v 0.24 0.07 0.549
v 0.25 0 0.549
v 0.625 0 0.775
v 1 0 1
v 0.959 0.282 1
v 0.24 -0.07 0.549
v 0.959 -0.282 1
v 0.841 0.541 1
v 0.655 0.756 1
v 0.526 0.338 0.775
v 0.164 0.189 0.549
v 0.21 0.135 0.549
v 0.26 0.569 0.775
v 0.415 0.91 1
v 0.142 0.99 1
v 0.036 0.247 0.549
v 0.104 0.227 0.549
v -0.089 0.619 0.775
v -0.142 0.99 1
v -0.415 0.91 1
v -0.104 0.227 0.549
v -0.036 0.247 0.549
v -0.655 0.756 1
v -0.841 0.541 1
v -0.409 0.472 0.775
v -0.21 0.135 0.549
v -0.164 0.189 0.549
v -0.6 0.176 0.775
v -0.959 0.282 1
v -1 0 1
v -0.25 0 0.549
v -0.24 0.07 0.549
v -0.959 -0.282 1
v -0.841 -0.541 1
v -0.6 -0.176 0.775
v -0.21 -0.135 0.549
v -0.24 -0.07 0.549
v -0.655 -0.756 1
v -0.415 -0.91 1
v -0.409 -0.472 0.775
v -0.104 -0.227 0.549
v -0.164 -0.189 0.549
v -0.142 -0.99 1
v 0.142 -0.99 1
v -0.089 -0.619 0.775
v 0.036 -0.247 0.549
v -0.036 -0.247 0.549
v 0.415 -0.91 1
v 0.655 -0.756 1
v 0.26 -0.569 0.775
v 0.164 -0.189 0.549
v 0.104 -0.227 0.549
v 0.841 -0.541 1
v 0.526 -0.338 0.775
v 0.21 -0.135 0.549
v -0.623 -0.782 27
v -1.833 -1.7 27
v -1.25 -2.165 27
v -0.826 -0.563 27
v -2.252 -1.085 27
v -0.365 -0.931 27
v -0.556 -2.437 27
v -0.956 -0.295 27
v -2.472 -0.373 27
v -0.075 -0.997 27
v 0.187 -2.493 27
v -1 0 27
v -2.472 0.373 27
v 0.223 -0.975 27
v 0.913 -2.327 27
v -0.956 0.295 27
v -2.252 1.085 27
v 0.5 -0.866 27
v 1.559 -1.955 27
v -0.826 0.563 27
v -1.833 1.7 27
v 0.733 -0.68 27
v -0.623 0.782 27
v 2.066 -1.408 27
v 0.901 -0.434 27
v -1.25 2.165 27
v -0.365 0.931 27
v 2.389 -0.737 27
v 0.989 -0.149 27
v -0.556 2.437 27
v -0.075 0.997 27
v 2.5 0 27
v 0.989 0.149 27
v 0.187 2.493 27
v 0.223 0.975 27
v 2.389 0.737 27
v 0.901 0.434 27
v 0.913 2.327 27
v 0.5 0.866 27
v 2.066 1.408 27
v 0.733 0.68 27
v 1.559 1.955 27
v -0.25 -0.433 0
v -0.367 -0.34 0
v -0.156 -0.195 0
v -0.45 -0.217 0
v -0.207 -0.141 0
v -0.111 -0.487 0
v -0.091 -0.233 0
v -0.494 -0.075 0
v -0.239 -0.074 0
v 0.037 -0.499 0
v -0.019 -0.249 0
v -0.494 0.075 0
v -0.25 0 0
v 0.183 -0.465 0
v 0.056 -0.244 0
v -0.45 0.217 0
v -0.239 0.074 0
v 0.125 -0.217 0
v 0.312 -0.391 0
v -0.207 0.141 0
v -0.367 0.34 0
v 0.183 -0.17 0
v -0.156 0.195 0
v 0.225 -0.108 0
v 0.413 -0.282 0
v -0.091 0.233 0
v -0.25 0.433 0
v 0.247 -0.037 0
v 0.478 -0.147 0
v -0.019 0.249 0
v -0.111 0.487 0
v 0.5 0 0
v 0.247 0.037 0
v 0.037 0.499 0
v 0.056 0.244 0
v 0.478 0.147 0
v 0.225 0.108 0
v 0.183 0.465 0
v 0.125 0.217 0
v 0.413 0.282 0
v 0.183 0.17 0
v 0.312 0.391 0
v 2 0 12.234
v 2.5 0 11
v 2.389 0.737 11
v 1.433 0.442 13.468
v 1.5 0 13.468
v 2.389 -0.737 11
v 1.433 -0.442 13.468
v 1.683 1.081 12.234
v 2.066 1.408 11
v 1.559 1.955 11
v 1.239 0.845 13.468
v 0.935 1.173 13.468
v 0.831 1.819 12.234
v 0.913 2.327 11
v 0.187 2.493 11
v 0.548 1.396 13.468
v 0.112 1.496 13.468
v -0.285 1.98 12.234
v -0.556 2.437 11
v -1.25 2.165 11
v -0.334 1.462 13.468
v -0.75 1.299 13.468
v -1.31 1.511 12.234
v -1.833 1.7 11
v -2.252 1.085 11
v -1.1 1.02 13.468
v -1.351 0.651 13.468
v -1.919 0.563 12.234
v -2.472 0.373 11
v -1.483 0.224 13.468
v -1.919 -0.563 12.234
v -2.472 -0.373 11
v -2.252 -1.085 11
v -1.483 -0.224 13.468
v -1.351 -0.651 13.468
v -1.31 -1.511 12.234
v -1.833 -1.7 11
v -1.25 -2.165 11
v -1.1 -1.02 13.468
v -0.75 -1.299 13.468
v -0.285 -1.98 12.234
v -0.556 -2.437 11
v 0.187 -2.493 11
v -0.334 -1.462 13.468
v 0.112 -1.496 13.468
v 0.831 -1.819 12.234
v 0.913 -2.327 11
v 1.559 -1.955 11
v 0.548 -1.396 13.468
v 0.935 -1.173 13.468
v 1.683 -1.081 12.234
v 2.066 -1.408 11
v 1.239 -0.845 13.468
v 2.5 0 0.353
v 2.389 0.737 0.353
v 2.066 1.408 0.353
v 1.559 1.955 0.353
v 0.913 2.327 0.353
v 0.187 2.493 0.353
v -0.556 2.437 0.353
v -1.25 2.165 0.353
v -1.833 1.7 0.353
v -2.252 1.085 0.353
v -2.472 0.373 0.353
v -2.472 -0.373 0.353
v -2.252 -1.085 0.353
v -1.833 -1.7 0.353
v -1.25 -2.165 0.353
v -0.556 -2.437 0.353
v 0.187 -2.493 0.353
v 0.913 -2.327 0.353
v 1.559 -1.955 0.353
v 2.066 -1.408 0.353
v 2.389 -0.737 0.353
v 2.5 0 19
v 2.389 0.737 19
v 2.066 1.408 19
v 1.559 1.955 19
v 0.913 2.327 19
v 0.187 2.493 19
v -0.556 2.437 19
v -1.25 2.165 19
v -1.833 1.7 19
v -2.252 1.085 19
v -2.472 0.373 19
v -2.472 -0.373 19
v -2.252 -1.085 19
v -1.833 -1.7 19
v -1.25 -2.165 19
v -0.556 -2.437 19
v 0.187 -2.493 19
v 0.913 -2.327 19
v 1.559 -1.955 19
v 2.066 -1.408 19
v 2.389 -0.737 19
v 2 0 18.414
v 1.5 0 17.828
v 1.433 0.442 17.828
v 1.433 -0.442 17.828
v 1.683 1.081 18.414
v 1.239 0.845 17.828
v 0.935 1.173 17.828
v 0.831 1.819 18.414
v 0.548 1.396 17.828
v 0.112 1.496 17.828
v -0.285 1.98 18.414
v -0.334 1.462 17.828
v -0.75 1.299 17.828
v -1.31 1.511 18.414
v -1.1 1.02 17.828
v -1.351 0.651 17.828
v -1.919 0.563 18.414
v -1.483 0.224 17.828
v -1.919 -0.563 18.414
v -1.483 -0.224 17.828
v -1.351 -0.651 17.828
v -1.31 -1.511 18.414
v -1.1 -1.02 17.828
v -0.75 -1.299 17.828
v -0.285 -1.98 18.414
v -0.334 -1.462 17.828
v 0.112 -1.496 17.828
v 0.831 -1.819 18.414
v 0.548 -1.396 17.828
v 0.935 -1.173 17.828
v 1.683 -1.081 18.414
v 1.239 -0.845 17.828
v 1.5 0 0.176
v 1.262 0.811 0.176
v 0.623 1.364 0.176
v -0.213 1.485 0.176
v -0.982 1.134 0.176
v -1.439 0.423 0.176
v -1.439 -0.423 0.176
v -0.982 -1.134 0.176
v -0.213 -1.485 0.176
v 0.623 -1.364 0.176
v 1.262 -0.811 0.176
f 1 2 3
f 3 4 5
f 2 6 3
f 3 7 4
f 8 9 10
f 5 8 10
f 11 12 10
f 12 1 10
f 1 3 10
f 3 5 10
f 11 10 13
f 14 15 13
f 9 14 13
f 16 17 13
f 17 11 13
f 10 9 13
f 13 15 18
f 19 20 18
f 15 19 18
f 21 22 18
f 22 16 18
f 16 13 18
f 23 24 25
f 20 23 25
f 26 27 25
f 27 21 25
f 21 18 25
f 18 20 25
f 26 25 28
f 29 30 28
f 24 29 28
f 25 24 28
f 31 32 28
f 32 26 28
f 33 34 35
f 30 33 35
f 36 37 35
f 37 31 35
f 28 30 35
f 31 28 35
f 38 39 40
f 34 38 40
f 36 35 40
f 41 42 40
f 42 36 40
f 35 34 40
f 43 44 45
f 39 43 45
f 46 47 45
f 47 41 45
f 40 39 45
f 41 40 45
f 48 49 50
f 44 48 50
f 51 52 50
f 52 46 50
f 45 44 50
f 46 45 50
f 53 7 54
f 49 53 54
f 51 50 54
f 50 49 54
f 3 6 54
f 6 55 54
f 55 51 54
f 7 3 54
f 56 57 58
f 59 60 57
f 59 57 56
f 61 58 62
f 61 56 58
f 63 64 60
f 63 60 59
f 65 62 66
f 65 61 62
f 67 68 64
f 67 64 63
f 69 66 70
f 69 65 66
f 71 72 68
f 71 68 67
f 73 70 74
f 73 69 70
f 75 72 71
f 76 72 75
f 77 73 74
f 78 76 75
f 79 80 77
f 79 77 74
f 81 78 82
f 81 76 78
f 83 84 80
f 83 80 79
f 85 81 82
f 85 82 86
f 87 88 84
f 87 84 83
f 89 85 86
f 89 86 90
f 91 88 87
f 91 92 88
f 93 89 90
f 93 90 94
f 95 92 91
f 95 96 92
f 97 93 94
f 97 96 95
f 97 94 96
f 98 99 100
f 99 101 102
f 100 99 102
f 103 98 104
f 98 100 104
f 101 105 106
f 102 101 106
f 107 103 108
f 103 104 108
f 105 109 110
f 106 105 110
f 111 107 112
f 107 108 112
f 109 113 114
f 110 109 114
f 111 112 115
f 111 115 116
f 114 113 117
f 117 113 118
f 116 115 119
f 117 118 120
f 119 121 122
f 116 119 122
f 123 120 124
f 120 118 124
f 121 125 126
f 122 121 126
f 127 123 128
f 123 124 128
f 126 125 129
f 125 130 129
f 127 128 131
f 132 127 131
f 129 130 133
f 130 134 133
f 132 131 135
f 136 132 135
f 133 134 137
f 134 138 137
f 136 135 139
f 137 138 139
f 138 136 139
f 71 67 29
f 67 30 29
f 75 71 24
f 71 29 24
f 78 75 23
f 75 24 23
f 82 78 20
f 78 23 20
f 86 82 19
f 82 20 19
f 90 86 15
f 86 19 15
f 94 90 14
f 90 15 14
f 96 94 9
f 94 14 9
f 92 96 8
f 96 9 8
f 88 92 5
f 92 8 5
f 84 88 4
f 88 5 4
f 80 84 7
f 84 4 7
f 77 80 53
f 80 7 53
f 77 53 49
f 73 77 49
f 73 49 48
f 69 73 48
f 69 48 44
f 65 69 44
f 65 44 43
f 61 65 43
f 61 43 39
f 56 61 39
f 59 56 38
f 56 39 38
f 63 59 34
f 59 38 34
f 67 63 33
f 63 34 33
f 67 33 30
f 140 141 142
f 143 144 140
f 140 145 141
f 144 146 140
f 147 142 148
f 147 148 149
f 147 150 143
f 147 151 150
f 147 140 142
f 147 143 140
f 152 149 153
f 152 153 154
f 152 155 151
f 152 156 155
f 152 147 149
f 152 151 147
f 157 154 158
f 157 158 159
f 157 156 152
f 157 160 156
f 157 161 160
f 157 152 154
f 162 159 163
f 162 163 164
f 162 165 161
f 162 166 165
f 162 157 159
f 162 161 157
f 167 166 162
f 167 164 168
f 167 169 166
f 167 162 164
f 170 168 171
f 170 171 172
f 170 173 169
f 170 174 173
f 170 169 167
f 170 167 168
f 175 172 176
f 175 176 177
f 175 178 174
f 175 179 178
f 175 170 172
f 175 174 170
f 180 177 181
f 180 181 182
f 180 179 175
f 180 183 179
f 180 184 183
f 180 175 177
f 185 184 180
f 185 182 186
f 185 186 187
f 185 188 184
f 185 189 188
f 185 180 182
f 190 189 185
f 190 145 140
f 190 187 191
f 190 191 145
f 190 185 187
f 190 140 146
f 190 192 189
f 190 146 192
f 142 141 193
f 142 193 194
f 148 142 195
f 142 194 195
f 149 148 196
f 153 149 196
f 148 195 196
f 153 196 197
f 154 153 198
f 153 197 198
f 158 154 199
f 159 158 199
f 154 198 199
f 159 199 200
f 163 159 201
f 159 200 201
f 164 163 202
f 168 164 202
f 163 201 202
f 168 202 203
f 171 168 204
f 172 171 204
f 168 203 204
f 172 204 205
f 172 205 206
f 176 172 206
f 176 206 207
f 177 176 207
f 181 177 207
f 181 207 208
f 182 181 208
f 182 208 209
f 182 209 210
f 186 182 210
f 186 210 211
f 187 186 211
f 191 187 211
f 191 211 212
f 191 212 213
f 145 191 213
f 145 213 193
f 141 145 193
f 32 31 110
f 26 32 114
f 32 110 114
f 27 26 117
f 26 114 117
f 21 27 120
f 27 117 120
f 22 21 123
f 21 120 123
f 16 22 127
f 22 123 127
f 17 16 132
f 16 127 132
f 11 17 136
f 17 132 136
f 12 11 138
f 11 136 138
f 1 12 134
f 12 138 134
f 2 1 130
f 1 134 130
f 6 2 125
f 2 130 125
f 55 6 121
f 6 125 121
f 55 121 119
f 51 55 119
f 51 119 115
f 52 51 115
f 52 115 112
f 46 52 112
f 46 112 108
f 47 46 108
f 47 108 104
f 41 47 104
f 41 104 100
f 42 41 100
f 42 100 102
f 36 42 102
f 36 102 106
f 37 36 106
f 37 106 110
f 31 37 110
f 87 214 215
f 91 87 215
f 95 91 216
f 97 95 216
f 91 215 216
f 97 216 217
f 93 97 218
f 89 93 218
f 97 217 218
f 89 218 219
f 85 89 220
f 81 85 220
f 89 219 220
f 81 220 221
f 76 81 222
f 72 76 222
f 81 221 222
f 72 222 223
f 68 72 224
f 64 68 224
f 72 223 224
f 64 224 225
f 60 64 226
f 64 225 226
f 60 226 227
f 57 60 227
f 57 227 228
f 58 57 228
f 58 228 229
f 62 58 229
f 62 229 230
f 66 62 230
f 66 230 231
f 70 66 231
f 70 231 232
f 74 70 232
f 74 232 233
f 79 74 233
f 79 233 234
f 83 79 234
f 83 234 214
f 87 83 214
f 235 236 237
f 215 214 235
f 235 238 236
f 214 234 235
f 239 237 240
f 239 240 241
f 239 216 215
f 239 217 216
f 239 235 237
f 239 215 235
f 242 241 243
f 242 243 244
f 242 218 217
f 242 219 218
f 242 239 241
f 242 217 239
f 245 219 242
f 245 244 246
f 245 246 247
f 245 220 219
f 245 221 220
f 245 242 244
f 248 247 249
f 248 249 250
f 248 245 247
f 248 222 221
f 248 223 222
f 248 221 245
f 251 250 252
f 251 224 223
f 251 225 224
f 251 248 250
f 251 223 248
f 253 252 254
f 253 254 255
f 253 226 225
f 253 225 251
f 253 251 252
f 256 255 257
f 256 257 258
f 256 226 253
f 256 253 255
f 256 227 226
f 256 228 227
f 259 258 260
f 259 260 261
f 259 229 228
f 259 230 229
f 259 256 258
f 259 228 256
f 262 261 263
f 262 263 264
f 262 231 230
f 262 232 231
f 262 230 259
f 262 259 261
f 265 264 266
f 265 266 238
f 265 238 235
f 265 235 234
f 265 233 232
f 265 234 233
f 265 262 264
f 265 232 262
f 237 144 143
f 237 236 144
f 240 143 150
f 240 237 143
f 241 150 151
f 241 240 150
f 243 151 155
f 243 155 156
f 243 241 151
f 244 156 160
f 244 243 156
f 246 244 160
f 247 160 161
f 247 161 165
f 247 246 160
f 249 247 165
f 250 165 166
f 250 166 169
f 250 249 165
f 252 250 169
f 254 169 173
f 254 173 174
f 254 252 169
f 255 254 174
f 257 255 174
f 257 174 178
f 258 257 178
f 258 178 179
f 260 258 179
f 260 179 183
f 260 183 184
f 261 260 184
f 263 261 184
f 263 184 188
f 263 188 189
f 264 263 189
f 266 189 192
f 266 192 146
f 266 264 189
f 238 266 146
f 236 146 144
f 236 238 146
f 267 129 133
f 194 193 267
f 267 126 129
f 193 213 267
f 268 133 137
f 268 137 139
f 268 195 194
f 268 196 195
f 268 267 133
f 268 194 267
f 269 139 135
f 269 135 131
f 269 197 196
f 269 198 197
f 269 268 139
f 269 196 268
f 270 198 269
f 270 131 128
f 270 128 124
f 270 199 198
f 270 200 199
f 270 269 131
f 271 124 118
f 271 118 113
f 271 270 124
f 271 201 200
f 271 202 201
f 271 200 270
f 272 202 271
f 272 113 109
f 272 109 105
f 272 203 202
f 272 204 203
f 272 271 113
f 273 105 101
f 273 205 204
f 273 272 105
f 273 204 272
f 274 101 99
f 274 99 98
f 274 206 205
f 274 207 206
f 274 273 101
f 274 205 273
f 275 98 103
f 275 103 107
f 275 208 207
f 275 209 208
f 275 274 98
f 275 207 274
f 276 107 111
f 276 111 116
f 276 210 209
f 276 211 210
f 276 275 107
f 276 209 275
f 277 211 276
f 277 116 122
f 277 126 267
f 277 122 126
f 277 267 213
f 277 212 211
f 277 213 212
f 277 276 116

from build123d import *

# Parameters (mm, degrees)
SKETCH1_R                    = 2.5
BOSS_EXTRUDE1_DEPTH          = 27
CHAMFER1_SIZE                = 2
CHAMFER1_SIZE2               = 0.352653961
F_2_0_2_DIAMETER_HOLE1_D     = 2
F_2_0_2_DIAMETER_HOLE1_DEPTH = 26
F_2_0_2_DIAMETER_HOLE1_TIP   = 0.600860619
CUT_EXTRUDE1_REACH           = 29
SKETCH6_R                    = 0.25


with BuildPart() as part:
    # Sketch1 → Boss-Extrude1 (new body)
    with BuildSketch(Plane.XY):
        Circle(SKETCH1_R)
    extrude(amount=BOSS_EXTRUDE1_DEPTH)

    # Sketch3 → Cut-Revolve1 (revolve, cut)
    with BuildSketch(Plane(origin=(0, 0, 0), x_dir=(1, 0, 0), z_dir=(0, 1, 0))):
        Polygon((2.5, -11), (1.5, -13.467842271), (1.5, -17.827676266), (2.5, -19), (3.138230266, -19), (3.138230266, -11), align=None)
    revolve(axis=Axis((0, 0, 0), (0, 0, 1)), mode=Mode.SUBTRACT)

    # Chamfer1
    chamfer1_edges = [part.edges().sort_by_distance(p)[0] for p in [
        (-2.5, 0, 0),
    ]]
    chamfer1_side = [part.faces().sort_by_distance(p)[0] for p in [
        (0, 0, 0),
    ]]
    chamfer(chamfer1_edges, length=CHAMFER1_SIZE, length2=CHAMFER1_SIZE2, reference=chamfer1_side[0])

    # Ø2.0 (2) Diameter Hole1
    with Locations(Plane.XY.offset(27)):
        with Locations((0, 0)):
            Hole(F_2_0_2_DIAMETER_HOLE1_D / 2, depth=F_2_0_2_DIAMETER_HOLE1_DEPTH)
            with Locations((0, 0, -(F_2_0_2_DIAMETER_HOLE1_DEPTH + F_2_0_2_DIAMETER_HOLE1_TIP / 2))):  # 118° drill point
                Cone(0, F_2_0_2_DIAMETER_HOLE1_D / 2, F_2_0_2_DIAMETER_HOLE1_TIP, mode=Mode.SUBTRACT)

    # Sketch6 → Cut-Extrude1 (cut, up to next)
    with BuildSketch(Plane(origin=(0, 0, 0), x_dir=(-1, 0, 0), z_dir=(0, 0, -1)), mode=Mode.PRIVATE) as cut_extrude1_sk1:
        Circle(SKETCH6_R)
    cut_extrude1_tool1 = extrude(cut_extrude1_sk1.sketch, amount=-CUT_EXTRUDE1_REACH, mode=Mode.PRIVATE) & part.part
    add(cut_extrude1_tool1.solids().sort_by_distance((0, 0, 0))[0], mode=Mode.SUBTRACT)


solid = part.part
